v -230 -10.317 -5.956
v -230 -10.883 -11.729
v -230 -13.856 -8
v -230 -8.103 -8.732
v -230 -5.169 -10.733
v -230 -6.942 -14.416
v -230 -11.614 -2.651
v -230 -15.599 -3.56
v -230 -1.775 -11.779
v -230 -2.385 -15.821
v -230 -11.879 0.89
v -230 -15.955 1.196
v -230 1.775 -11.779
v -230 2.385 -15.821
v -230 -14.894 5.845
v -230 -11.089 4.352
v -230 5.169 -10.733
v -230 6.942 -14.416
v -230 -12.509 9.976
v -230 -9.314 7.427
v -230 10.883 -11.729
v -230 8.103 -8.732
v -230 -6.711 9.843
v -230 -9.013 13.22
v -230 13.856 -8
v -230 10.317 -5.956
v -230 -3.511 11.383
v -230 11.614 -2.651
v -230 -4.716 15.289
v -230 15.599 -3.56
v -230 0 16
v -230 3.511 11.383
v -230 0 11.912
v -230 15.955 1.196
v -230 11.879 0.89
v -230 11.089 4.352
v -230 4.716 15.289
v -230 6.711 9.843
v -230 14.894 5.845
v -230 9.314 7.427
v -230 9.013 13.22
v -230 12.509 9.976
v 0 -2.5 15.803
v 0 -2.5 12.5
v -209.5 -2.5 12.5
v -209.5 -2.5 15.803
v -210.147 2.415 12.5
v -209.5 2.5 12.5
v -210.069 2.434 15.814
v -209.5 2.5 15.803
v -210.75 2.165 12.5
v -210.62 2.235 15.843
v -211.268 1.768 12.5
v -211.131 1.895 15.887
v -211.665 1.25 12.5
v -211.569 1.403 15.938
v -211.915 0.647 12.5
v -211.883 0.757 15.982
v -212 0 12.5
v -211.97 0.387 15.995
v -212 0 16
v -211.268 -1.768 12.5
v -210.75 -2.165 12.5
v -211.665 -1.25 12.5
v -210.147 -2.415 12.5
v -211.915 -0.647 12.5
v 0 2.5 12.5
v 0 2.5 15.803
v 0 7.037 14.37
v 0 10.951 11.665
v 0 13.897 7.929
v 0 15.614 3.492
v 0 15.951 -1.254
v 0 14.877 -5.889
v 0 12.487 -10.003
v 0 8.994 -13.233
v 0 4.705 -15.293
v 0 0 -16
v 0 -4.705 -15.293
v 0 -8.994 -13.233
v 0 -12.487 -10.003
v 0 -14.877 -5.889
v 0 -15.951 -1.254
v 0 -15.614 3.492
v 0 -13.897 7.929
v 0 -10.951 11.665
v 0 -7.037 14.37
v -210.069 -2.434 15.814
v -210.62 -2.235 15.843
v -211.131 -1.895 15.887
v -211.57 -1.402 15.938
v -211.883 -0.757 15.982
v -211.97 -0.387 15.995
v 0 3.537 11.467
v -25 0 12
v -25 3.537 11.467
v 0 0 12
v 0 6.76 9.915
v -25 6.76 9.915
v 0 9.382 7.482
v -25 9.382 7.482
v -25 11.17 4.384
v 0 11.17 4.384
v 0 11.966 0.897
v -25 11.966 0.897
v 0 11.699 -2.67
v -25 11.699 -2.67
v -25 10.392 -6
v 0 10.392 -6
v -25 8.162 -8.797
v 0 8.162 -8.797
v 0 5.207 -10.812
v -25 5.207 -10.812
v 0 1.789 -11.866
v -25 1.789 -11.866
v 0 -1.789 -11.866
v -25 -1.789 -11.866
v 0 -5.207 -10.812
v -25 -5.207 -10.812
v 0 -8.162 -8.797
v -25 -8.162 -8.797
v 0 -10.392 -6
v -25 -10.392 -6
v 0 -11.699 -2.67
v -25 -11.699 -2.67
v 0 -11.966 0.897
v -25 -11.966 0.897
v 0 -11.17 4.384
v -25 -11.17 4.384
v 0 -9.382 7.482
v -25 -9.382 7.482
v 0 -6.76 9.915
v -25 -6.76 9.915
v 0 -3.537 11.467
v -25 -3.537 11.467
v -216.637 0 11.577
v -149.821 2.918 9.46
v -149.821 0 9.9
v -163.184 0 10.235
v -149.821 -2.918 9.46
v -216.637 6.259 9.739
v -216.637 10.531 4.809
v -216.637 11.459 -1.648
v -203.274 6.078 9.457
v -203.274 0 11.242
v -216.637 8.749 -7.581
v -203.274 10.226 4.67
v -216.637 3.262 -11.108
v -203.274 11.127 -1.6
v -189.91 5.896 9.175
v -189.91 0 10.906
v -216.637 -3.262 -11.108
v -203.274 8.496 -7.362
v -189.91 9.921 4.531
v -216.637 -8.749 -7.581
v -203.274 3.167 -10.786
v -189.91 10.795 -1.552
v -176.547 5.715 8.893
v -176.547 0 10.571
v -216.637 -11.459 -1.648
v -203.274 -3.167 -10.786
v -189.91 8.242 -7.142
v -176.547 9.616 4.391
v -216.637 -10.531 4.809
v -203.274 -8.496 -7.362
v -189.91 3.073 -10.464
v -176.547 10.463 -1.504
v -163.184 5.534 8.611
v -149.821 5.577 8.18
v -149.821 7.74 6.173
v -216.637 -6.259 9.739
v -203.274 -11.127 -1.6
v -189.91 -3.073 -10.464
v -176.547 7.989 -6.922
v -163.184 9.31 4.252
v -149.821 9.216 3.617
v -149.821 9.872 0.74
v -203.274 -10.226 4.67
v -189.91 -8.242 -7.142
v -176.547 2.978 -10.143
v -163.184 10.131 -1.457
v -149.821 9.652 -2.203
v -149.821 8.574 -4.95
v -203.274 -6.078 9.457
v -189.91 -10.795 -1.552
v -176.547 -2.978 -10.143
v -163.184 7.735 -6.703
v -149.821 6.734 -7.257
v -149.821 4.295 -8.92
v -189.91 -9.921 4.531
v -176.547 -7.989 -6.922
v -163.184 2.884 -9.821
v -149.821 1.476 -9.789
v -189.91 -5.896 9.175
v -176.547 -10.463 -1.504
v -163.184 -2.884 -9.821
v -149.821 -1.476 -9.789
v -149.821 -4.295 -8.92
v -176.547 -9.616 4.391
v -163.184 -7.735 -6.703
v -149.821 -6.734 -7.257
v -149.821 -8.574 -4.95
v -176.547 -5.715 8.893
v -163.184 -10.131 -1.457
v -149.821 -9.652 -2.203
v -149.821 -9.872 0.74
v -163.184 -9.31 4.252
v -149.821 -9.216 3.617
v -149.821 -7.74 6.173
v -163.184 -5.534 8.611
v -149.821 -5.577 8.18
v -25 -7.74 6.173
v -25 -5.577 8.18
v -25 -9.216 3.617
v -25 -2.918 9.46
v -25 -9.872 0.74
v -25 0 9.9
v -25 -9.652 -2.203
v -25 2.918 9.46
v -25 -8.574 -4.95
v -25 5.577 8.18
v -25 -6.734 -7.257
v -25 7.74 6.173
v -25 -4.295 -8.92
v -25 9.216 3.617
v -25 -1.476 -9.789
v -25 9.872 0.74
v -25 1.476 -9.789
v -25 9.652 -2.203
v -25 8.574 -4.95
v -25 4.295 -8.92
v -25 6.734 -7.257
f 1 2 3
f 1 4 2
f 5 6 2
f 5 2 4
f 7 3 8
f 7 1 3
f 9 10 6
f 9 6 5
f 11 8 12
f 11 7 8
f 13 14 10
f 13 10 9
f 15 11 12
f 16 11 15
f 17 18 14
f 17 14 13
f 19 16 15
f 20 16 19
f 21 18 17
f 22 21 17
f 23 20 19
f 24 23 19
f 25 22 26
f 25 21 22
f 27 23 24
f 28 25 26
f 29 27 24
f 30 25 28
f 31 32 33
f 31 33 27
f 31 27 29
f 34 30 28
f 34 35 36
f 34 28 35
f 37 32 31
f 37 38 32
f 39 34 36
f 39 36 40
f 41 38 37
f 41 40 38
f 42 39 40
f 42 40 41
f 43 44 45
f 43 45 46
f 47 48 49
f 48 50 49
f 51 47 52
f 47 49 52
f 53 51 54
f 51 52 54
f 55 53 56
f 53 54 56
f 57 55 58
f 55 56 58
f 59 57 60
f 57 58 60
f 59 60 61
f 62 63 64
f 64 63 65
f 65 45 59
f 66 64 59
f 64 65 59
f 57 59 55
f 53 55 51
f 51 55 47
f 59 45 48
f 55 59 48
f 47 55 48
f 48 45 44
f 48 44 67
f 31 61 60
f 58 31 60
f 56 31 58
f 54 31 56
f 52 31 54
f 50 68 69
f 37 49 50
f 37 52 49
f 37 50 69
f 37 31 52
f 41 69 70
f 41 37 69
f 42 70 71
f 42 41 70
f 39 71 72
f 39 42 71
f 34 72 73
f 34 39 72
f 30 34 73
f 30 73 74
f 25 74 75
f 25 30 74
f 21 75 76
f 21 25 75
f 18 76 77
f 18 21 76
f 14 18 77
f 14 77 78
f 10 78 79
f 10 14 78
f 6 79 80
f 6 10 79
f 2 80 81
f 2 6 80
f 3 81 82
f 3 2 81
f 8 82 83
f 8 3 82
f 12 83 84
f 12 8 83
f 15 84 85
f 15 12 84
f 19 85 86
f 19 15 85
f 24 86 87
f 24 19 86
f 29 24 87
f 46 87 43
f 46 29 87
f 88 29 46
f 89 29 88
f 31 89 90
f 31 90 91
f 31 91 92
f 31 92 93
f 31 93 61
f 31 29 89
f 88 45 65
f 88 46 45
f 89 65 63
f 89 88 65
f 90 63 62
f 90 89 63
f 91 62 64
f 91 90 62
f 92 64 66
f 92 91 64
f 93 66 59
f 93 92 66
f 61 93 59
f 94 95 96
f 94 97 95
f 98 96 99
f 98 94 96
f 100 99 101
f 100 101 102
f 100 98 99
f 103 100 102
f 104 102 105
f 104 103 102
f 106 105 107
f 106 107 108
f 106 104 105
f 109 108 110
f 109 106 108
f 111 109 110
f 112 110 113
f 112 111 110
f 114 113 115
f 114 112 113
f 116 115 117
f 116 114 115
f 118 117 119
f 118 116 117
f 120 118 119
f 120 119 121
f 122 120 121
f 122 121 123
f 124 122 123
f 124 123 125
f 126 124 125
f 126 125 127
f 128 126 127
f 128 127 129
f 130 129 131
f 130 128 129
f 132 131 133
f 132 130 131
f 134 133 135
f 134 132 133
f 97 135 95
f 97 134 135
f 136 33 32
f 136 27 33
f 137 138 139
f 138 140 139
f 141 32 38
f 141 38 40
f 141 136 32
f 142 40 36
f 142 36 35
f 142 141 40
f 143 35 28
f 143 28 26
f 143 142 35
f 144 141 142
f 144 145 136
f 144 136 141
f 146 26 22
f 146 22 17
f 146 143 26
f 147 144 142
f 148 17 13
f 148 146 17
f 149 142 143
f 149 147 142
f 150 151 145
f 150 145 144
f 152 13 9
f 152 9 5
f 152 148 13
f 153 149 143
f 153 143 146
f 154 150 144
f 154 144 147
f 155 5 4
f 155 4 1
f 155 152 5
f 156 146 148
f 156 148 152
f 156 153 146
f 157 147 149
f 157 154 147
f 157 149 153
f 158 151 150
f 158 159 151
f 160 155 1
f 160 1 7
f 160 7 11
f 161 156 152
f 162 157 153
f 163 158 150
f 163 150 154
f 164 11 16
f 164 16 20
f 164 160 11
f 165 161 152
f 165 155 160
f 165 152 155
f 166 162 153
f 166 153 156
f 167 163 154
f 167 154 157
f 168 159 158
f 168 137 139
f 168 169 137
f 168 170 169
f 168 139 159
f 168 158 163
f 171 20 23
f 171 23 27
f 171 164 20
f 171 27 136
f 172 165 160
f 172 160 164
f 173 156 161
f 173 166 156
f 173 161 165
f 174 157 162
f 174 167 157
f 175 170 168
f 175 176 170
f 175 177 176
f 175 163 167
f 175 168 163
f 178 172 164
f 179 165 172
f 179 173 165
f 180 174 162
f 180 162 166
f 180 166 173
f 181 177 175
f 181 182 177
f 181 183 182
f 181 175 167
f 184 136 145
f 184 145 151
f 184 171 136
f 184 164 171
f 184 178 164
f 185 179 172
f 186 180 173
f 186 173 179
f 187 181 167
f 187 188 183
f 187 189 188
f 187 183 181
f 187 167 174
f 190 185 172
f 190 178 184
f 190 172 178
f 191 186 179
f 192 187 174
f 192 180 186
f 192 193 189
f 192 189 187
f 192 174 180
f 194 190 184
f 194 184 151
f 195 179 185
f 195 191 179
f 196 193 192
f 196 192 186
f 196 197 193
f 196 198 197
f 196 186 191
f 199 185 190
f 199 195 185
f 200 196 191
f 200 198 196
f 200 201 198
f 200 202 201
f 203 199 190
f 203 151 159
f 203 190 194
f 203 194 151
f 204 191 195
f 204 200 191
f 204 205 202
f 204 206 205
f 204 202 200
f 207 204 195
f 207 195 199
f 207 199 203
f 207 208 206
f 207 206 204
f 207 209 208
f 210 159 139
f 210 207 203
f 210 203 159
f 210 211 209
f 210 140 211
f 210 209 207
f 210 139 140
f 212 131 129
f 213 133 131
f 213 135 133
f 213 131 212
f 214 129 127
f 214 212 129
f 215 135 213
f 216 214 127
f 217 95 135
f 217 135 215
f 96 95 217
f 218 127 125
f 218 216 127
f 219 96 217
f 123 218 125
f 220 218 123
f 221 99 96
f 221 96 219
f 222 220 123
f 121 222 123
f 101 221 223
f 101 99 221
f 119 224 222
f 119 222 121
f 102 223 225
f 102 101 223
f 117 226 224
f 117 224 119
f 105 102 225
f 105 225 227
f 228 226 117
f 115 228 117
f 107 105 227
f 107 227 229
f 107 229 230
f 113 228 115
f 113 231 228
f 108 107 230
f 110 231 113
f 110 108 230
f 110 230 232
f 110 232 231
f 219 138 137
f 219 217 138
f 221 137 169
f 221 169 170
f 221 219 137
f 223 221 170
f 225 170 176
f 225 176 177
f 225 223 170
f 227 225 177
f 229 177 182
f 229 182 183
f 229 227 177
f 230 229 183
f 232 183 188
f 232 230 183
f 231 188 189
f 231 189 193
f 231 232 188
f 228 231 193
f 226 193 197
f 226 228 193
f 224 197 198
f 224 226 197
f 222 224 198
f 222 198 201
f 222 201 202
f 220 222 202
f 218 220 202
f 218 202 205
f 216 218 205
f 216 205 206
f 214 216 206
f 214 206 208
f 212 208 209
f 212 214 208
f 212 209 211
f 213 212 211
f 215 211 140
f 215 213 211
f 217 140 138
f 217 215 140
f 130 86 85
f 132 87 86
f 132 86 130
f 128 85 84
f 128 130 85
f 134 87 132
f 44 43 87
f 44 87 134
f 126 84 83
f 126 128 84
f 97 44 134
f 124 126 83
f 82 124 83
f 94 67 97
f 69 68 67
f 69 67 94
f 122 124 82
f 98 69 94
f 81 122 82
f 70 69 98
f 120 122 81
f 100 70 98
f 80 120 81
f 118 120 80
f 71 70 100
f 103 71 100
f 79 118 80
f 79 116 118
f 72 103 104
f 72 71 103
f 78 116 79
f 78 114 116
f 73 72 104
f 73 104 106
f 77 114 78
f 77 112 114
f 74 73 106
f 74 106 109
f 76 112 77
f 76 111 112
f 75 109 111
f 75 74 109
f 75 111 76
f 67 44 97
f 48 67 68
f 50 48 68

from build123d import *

# Parameters (mm, degrees)
F2_W     = 5
F2_H     = 4
F3_DEPTH = 212
F4_R     = 2.49999


# Not quite as in the source:
# - a fillet or chamfer is up to 0.001 mm smaller than in the source, because OpenCascade refuses the exact size
# - a feature names something its author has since deleted; it is built from what else it names


with BuildPart() as f1:
    # F0 (on Front) → F1 (revolve)
    with BuildSketch(Plane.XZ):
        Polygon((0, 12), (0, 16), (-230, 16), (-230, 11.9125), (-149.8207171315, 9.9), (-25, 9.9), (-25, 12), align=None)
    revolve(axis=Axis((-16.2521931838, 0, 0), (-1, 0, 0)))

    # F2 (on Right) → F3 (cut)
    with BuildSketch(Plane.YZ):
        with Locations((0, 14.5)):
            Rectangle(F2_W, F2_H)
    extrude(amount=-F3_DEPTH, mode=Mode.SUBTRACT)

    # F4 (radius 2.5 in the source; OpenCascade refuses exactly that, so slightly less here)
    f4_edges = [f1.edges().sort_by_distance(p)[0] for p in [
        (-212, 2.5, 14.15174),
        (-212, -2.5, 14.15174),
    ]]
    fillet(f4_edges, radius=F4_R)


solid = f1.part
